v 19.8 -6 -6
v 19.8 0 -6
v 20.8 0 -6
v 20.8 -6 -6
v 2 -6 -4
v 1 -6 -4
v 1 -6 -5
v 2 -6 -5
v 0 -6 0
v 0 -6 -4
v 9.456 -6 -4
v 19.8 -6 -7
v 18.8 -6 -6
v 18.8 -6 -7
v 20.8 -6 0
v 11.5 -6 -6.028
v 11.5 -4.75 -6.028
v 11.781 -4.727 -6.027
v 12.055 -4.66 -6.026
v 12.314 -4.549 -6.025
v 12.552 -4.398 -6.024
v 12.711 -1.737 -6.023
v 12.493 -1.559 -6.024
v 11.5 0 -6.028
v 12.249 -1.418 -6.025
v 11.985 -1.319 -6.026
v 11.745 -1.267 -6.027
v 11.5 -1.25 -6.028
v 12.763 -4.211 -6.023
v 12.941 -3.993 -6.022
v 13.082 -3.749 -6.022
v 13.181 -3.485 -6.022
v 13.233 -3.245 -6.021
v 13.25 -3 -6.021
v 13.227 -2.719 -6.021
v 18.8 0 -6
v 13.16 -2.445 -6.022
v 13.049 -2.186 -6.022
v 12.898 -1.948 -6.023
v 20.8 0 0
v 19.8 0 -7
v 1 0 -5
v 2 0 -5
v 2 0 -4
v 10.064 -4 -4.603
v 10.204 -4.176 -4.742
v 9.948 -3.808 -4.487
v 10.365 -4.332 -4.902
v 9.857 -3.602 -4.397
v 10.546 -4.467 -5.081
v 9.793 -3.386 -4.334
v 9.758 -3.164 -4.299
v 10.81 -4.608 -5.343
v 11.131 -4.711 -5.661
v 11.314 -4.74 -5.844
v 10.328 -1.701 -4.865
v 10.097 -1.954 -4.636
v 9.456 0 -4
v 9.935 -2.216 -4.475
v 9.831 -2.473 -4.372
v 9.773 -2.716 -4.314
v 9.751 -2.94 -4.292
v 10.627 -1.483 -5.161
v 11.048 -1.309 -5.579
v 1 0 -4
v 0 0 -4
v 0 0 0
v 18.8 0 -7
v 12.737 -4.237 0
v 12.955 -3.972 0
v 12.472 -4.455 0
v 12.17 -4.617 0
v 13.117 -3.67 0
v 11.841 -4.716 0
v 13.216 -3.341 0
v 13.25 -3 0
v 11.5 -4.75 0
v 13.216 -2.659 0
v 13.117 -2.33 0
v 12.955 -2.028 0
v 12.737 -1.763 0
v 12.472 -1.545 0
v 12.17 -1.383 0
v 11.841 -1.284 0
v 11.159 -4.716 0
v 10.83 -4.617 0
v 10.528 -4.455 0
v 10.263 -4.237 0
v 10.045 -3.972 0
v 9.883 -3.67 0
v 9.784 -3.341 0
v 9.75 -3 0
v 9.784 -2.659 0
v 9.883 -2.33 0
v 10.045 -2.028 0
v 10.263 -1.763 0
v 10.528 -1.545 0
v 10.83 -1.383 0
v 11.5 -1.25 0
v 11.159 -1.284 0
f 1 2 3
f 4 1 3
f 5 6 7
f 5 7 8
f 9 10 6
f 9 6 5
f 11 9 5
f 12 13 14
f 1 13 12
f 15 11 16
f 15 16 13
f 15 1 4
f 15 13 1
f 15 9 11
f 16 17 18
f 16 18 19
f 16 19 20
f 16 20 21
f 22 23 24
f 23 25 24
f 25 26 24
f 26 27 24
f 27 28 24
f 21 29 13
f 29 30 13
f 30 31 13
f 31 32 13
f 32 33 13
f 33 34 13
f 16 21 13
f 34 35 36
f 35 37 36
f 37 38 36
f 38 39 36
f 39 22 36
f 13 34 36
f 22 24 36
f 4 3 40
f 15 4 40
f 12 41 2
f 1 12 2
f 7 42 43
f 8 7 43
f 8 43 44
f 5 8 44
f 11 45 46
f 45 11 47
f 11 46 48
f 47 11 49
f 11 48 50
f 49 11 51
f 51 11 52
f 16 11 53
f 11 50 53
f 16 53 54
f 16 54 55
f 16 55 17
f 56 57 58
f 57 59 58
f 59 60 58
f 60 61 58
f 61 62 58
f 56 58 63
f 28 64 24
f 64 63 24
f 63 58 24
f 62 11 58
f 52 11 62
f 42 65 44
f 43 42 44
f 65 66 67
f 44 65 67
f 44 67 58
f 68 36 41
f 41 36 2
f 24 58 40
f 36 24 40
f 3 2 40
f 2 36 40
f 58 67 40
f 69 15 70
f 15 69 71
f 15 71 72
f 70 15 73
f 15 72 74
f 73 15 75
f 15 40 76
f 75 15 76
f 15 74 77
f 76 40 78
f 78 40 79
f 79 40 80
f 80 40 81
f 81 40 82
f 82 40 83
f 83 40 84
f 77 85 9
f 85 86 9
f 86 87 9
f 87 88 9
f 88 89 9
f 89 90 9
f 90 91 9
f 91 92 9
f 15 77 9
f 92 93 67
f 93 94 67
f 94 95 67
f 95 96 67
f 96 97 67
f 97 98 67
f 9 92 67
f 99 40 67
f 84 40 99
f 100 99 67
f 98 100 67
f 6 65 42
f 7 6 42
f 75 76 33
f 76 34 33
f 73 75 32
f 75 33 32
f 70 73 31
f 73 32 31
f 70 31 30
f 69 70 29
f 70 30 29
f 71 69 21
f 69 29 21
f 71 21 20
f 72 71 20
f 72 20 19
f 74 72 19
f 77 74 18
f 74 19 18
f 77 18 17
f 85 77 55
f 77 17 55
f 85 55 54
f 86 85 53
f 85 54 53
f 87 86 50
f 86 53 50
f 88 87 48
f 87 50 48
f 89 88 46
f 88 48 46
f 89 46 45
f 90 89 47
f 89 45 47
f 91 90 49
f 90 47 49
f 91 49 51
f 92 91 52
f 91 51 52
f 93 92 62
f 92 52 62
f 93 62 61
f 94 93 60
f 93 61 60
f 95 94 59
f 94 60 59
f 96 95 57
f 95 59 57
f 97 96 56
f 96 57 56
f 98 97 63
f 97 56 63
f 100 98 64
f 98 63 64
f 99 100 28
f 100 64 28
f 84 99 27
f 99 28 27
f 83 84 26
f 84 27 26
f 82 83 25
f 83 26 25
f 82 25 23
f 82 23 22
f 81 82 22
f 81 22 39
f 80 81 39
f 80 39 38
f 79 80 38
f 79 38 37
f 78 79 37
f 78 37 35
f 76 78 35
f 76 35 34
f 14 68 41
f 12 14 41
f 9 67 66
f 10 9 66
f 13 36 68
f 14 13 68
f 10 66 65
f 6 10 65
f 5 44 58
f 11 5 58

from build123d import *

# Parameters (mm, degrees)
F1_DEPTH      = 6
F2_R          = 1.75
F3_DEPTH      = 4.001
F3_DEPTH_BACK = 3.001


# Not quite as in the source:
# - a feature of the source that left no trace in its solid (it failed there, or was rolled back) is left out


with BuildPart() as f1:
    # F0 (on Front) → F1 (new body)
    with BuildSketch(Plane.XZ):
        Polygon((20.8, 0), (0, 0), (0, -4), (1, -4), (1, -5), (2, -5), (2, -4), (9.4564415496, -4), (11.5, -6.0279625468), (18.8, -6), (18.8, -7), (19.8, -7), (19.8, -6), (20.8, -6), align=None)
    extrude(amount=F1_DEPTH)

    # F2 (on face) → F3 (cut, two sides)
    with BuildSketch(Plane(origin=(0, 0, -4), x_dir=(1, 0, 0), z_dir=(0, 0, -1))) as f3_sk:
        with Locations((11.5, 3)):
            Circle(F2_R)
    extrude(amount=-F3_DEPTH, mode=Mode.SUBTRACT)
    extrude(f3_sk.sketch, amount=F3_DEPTH_BACK, mode=Mode.SUBTRACT)


solid = f1.part
